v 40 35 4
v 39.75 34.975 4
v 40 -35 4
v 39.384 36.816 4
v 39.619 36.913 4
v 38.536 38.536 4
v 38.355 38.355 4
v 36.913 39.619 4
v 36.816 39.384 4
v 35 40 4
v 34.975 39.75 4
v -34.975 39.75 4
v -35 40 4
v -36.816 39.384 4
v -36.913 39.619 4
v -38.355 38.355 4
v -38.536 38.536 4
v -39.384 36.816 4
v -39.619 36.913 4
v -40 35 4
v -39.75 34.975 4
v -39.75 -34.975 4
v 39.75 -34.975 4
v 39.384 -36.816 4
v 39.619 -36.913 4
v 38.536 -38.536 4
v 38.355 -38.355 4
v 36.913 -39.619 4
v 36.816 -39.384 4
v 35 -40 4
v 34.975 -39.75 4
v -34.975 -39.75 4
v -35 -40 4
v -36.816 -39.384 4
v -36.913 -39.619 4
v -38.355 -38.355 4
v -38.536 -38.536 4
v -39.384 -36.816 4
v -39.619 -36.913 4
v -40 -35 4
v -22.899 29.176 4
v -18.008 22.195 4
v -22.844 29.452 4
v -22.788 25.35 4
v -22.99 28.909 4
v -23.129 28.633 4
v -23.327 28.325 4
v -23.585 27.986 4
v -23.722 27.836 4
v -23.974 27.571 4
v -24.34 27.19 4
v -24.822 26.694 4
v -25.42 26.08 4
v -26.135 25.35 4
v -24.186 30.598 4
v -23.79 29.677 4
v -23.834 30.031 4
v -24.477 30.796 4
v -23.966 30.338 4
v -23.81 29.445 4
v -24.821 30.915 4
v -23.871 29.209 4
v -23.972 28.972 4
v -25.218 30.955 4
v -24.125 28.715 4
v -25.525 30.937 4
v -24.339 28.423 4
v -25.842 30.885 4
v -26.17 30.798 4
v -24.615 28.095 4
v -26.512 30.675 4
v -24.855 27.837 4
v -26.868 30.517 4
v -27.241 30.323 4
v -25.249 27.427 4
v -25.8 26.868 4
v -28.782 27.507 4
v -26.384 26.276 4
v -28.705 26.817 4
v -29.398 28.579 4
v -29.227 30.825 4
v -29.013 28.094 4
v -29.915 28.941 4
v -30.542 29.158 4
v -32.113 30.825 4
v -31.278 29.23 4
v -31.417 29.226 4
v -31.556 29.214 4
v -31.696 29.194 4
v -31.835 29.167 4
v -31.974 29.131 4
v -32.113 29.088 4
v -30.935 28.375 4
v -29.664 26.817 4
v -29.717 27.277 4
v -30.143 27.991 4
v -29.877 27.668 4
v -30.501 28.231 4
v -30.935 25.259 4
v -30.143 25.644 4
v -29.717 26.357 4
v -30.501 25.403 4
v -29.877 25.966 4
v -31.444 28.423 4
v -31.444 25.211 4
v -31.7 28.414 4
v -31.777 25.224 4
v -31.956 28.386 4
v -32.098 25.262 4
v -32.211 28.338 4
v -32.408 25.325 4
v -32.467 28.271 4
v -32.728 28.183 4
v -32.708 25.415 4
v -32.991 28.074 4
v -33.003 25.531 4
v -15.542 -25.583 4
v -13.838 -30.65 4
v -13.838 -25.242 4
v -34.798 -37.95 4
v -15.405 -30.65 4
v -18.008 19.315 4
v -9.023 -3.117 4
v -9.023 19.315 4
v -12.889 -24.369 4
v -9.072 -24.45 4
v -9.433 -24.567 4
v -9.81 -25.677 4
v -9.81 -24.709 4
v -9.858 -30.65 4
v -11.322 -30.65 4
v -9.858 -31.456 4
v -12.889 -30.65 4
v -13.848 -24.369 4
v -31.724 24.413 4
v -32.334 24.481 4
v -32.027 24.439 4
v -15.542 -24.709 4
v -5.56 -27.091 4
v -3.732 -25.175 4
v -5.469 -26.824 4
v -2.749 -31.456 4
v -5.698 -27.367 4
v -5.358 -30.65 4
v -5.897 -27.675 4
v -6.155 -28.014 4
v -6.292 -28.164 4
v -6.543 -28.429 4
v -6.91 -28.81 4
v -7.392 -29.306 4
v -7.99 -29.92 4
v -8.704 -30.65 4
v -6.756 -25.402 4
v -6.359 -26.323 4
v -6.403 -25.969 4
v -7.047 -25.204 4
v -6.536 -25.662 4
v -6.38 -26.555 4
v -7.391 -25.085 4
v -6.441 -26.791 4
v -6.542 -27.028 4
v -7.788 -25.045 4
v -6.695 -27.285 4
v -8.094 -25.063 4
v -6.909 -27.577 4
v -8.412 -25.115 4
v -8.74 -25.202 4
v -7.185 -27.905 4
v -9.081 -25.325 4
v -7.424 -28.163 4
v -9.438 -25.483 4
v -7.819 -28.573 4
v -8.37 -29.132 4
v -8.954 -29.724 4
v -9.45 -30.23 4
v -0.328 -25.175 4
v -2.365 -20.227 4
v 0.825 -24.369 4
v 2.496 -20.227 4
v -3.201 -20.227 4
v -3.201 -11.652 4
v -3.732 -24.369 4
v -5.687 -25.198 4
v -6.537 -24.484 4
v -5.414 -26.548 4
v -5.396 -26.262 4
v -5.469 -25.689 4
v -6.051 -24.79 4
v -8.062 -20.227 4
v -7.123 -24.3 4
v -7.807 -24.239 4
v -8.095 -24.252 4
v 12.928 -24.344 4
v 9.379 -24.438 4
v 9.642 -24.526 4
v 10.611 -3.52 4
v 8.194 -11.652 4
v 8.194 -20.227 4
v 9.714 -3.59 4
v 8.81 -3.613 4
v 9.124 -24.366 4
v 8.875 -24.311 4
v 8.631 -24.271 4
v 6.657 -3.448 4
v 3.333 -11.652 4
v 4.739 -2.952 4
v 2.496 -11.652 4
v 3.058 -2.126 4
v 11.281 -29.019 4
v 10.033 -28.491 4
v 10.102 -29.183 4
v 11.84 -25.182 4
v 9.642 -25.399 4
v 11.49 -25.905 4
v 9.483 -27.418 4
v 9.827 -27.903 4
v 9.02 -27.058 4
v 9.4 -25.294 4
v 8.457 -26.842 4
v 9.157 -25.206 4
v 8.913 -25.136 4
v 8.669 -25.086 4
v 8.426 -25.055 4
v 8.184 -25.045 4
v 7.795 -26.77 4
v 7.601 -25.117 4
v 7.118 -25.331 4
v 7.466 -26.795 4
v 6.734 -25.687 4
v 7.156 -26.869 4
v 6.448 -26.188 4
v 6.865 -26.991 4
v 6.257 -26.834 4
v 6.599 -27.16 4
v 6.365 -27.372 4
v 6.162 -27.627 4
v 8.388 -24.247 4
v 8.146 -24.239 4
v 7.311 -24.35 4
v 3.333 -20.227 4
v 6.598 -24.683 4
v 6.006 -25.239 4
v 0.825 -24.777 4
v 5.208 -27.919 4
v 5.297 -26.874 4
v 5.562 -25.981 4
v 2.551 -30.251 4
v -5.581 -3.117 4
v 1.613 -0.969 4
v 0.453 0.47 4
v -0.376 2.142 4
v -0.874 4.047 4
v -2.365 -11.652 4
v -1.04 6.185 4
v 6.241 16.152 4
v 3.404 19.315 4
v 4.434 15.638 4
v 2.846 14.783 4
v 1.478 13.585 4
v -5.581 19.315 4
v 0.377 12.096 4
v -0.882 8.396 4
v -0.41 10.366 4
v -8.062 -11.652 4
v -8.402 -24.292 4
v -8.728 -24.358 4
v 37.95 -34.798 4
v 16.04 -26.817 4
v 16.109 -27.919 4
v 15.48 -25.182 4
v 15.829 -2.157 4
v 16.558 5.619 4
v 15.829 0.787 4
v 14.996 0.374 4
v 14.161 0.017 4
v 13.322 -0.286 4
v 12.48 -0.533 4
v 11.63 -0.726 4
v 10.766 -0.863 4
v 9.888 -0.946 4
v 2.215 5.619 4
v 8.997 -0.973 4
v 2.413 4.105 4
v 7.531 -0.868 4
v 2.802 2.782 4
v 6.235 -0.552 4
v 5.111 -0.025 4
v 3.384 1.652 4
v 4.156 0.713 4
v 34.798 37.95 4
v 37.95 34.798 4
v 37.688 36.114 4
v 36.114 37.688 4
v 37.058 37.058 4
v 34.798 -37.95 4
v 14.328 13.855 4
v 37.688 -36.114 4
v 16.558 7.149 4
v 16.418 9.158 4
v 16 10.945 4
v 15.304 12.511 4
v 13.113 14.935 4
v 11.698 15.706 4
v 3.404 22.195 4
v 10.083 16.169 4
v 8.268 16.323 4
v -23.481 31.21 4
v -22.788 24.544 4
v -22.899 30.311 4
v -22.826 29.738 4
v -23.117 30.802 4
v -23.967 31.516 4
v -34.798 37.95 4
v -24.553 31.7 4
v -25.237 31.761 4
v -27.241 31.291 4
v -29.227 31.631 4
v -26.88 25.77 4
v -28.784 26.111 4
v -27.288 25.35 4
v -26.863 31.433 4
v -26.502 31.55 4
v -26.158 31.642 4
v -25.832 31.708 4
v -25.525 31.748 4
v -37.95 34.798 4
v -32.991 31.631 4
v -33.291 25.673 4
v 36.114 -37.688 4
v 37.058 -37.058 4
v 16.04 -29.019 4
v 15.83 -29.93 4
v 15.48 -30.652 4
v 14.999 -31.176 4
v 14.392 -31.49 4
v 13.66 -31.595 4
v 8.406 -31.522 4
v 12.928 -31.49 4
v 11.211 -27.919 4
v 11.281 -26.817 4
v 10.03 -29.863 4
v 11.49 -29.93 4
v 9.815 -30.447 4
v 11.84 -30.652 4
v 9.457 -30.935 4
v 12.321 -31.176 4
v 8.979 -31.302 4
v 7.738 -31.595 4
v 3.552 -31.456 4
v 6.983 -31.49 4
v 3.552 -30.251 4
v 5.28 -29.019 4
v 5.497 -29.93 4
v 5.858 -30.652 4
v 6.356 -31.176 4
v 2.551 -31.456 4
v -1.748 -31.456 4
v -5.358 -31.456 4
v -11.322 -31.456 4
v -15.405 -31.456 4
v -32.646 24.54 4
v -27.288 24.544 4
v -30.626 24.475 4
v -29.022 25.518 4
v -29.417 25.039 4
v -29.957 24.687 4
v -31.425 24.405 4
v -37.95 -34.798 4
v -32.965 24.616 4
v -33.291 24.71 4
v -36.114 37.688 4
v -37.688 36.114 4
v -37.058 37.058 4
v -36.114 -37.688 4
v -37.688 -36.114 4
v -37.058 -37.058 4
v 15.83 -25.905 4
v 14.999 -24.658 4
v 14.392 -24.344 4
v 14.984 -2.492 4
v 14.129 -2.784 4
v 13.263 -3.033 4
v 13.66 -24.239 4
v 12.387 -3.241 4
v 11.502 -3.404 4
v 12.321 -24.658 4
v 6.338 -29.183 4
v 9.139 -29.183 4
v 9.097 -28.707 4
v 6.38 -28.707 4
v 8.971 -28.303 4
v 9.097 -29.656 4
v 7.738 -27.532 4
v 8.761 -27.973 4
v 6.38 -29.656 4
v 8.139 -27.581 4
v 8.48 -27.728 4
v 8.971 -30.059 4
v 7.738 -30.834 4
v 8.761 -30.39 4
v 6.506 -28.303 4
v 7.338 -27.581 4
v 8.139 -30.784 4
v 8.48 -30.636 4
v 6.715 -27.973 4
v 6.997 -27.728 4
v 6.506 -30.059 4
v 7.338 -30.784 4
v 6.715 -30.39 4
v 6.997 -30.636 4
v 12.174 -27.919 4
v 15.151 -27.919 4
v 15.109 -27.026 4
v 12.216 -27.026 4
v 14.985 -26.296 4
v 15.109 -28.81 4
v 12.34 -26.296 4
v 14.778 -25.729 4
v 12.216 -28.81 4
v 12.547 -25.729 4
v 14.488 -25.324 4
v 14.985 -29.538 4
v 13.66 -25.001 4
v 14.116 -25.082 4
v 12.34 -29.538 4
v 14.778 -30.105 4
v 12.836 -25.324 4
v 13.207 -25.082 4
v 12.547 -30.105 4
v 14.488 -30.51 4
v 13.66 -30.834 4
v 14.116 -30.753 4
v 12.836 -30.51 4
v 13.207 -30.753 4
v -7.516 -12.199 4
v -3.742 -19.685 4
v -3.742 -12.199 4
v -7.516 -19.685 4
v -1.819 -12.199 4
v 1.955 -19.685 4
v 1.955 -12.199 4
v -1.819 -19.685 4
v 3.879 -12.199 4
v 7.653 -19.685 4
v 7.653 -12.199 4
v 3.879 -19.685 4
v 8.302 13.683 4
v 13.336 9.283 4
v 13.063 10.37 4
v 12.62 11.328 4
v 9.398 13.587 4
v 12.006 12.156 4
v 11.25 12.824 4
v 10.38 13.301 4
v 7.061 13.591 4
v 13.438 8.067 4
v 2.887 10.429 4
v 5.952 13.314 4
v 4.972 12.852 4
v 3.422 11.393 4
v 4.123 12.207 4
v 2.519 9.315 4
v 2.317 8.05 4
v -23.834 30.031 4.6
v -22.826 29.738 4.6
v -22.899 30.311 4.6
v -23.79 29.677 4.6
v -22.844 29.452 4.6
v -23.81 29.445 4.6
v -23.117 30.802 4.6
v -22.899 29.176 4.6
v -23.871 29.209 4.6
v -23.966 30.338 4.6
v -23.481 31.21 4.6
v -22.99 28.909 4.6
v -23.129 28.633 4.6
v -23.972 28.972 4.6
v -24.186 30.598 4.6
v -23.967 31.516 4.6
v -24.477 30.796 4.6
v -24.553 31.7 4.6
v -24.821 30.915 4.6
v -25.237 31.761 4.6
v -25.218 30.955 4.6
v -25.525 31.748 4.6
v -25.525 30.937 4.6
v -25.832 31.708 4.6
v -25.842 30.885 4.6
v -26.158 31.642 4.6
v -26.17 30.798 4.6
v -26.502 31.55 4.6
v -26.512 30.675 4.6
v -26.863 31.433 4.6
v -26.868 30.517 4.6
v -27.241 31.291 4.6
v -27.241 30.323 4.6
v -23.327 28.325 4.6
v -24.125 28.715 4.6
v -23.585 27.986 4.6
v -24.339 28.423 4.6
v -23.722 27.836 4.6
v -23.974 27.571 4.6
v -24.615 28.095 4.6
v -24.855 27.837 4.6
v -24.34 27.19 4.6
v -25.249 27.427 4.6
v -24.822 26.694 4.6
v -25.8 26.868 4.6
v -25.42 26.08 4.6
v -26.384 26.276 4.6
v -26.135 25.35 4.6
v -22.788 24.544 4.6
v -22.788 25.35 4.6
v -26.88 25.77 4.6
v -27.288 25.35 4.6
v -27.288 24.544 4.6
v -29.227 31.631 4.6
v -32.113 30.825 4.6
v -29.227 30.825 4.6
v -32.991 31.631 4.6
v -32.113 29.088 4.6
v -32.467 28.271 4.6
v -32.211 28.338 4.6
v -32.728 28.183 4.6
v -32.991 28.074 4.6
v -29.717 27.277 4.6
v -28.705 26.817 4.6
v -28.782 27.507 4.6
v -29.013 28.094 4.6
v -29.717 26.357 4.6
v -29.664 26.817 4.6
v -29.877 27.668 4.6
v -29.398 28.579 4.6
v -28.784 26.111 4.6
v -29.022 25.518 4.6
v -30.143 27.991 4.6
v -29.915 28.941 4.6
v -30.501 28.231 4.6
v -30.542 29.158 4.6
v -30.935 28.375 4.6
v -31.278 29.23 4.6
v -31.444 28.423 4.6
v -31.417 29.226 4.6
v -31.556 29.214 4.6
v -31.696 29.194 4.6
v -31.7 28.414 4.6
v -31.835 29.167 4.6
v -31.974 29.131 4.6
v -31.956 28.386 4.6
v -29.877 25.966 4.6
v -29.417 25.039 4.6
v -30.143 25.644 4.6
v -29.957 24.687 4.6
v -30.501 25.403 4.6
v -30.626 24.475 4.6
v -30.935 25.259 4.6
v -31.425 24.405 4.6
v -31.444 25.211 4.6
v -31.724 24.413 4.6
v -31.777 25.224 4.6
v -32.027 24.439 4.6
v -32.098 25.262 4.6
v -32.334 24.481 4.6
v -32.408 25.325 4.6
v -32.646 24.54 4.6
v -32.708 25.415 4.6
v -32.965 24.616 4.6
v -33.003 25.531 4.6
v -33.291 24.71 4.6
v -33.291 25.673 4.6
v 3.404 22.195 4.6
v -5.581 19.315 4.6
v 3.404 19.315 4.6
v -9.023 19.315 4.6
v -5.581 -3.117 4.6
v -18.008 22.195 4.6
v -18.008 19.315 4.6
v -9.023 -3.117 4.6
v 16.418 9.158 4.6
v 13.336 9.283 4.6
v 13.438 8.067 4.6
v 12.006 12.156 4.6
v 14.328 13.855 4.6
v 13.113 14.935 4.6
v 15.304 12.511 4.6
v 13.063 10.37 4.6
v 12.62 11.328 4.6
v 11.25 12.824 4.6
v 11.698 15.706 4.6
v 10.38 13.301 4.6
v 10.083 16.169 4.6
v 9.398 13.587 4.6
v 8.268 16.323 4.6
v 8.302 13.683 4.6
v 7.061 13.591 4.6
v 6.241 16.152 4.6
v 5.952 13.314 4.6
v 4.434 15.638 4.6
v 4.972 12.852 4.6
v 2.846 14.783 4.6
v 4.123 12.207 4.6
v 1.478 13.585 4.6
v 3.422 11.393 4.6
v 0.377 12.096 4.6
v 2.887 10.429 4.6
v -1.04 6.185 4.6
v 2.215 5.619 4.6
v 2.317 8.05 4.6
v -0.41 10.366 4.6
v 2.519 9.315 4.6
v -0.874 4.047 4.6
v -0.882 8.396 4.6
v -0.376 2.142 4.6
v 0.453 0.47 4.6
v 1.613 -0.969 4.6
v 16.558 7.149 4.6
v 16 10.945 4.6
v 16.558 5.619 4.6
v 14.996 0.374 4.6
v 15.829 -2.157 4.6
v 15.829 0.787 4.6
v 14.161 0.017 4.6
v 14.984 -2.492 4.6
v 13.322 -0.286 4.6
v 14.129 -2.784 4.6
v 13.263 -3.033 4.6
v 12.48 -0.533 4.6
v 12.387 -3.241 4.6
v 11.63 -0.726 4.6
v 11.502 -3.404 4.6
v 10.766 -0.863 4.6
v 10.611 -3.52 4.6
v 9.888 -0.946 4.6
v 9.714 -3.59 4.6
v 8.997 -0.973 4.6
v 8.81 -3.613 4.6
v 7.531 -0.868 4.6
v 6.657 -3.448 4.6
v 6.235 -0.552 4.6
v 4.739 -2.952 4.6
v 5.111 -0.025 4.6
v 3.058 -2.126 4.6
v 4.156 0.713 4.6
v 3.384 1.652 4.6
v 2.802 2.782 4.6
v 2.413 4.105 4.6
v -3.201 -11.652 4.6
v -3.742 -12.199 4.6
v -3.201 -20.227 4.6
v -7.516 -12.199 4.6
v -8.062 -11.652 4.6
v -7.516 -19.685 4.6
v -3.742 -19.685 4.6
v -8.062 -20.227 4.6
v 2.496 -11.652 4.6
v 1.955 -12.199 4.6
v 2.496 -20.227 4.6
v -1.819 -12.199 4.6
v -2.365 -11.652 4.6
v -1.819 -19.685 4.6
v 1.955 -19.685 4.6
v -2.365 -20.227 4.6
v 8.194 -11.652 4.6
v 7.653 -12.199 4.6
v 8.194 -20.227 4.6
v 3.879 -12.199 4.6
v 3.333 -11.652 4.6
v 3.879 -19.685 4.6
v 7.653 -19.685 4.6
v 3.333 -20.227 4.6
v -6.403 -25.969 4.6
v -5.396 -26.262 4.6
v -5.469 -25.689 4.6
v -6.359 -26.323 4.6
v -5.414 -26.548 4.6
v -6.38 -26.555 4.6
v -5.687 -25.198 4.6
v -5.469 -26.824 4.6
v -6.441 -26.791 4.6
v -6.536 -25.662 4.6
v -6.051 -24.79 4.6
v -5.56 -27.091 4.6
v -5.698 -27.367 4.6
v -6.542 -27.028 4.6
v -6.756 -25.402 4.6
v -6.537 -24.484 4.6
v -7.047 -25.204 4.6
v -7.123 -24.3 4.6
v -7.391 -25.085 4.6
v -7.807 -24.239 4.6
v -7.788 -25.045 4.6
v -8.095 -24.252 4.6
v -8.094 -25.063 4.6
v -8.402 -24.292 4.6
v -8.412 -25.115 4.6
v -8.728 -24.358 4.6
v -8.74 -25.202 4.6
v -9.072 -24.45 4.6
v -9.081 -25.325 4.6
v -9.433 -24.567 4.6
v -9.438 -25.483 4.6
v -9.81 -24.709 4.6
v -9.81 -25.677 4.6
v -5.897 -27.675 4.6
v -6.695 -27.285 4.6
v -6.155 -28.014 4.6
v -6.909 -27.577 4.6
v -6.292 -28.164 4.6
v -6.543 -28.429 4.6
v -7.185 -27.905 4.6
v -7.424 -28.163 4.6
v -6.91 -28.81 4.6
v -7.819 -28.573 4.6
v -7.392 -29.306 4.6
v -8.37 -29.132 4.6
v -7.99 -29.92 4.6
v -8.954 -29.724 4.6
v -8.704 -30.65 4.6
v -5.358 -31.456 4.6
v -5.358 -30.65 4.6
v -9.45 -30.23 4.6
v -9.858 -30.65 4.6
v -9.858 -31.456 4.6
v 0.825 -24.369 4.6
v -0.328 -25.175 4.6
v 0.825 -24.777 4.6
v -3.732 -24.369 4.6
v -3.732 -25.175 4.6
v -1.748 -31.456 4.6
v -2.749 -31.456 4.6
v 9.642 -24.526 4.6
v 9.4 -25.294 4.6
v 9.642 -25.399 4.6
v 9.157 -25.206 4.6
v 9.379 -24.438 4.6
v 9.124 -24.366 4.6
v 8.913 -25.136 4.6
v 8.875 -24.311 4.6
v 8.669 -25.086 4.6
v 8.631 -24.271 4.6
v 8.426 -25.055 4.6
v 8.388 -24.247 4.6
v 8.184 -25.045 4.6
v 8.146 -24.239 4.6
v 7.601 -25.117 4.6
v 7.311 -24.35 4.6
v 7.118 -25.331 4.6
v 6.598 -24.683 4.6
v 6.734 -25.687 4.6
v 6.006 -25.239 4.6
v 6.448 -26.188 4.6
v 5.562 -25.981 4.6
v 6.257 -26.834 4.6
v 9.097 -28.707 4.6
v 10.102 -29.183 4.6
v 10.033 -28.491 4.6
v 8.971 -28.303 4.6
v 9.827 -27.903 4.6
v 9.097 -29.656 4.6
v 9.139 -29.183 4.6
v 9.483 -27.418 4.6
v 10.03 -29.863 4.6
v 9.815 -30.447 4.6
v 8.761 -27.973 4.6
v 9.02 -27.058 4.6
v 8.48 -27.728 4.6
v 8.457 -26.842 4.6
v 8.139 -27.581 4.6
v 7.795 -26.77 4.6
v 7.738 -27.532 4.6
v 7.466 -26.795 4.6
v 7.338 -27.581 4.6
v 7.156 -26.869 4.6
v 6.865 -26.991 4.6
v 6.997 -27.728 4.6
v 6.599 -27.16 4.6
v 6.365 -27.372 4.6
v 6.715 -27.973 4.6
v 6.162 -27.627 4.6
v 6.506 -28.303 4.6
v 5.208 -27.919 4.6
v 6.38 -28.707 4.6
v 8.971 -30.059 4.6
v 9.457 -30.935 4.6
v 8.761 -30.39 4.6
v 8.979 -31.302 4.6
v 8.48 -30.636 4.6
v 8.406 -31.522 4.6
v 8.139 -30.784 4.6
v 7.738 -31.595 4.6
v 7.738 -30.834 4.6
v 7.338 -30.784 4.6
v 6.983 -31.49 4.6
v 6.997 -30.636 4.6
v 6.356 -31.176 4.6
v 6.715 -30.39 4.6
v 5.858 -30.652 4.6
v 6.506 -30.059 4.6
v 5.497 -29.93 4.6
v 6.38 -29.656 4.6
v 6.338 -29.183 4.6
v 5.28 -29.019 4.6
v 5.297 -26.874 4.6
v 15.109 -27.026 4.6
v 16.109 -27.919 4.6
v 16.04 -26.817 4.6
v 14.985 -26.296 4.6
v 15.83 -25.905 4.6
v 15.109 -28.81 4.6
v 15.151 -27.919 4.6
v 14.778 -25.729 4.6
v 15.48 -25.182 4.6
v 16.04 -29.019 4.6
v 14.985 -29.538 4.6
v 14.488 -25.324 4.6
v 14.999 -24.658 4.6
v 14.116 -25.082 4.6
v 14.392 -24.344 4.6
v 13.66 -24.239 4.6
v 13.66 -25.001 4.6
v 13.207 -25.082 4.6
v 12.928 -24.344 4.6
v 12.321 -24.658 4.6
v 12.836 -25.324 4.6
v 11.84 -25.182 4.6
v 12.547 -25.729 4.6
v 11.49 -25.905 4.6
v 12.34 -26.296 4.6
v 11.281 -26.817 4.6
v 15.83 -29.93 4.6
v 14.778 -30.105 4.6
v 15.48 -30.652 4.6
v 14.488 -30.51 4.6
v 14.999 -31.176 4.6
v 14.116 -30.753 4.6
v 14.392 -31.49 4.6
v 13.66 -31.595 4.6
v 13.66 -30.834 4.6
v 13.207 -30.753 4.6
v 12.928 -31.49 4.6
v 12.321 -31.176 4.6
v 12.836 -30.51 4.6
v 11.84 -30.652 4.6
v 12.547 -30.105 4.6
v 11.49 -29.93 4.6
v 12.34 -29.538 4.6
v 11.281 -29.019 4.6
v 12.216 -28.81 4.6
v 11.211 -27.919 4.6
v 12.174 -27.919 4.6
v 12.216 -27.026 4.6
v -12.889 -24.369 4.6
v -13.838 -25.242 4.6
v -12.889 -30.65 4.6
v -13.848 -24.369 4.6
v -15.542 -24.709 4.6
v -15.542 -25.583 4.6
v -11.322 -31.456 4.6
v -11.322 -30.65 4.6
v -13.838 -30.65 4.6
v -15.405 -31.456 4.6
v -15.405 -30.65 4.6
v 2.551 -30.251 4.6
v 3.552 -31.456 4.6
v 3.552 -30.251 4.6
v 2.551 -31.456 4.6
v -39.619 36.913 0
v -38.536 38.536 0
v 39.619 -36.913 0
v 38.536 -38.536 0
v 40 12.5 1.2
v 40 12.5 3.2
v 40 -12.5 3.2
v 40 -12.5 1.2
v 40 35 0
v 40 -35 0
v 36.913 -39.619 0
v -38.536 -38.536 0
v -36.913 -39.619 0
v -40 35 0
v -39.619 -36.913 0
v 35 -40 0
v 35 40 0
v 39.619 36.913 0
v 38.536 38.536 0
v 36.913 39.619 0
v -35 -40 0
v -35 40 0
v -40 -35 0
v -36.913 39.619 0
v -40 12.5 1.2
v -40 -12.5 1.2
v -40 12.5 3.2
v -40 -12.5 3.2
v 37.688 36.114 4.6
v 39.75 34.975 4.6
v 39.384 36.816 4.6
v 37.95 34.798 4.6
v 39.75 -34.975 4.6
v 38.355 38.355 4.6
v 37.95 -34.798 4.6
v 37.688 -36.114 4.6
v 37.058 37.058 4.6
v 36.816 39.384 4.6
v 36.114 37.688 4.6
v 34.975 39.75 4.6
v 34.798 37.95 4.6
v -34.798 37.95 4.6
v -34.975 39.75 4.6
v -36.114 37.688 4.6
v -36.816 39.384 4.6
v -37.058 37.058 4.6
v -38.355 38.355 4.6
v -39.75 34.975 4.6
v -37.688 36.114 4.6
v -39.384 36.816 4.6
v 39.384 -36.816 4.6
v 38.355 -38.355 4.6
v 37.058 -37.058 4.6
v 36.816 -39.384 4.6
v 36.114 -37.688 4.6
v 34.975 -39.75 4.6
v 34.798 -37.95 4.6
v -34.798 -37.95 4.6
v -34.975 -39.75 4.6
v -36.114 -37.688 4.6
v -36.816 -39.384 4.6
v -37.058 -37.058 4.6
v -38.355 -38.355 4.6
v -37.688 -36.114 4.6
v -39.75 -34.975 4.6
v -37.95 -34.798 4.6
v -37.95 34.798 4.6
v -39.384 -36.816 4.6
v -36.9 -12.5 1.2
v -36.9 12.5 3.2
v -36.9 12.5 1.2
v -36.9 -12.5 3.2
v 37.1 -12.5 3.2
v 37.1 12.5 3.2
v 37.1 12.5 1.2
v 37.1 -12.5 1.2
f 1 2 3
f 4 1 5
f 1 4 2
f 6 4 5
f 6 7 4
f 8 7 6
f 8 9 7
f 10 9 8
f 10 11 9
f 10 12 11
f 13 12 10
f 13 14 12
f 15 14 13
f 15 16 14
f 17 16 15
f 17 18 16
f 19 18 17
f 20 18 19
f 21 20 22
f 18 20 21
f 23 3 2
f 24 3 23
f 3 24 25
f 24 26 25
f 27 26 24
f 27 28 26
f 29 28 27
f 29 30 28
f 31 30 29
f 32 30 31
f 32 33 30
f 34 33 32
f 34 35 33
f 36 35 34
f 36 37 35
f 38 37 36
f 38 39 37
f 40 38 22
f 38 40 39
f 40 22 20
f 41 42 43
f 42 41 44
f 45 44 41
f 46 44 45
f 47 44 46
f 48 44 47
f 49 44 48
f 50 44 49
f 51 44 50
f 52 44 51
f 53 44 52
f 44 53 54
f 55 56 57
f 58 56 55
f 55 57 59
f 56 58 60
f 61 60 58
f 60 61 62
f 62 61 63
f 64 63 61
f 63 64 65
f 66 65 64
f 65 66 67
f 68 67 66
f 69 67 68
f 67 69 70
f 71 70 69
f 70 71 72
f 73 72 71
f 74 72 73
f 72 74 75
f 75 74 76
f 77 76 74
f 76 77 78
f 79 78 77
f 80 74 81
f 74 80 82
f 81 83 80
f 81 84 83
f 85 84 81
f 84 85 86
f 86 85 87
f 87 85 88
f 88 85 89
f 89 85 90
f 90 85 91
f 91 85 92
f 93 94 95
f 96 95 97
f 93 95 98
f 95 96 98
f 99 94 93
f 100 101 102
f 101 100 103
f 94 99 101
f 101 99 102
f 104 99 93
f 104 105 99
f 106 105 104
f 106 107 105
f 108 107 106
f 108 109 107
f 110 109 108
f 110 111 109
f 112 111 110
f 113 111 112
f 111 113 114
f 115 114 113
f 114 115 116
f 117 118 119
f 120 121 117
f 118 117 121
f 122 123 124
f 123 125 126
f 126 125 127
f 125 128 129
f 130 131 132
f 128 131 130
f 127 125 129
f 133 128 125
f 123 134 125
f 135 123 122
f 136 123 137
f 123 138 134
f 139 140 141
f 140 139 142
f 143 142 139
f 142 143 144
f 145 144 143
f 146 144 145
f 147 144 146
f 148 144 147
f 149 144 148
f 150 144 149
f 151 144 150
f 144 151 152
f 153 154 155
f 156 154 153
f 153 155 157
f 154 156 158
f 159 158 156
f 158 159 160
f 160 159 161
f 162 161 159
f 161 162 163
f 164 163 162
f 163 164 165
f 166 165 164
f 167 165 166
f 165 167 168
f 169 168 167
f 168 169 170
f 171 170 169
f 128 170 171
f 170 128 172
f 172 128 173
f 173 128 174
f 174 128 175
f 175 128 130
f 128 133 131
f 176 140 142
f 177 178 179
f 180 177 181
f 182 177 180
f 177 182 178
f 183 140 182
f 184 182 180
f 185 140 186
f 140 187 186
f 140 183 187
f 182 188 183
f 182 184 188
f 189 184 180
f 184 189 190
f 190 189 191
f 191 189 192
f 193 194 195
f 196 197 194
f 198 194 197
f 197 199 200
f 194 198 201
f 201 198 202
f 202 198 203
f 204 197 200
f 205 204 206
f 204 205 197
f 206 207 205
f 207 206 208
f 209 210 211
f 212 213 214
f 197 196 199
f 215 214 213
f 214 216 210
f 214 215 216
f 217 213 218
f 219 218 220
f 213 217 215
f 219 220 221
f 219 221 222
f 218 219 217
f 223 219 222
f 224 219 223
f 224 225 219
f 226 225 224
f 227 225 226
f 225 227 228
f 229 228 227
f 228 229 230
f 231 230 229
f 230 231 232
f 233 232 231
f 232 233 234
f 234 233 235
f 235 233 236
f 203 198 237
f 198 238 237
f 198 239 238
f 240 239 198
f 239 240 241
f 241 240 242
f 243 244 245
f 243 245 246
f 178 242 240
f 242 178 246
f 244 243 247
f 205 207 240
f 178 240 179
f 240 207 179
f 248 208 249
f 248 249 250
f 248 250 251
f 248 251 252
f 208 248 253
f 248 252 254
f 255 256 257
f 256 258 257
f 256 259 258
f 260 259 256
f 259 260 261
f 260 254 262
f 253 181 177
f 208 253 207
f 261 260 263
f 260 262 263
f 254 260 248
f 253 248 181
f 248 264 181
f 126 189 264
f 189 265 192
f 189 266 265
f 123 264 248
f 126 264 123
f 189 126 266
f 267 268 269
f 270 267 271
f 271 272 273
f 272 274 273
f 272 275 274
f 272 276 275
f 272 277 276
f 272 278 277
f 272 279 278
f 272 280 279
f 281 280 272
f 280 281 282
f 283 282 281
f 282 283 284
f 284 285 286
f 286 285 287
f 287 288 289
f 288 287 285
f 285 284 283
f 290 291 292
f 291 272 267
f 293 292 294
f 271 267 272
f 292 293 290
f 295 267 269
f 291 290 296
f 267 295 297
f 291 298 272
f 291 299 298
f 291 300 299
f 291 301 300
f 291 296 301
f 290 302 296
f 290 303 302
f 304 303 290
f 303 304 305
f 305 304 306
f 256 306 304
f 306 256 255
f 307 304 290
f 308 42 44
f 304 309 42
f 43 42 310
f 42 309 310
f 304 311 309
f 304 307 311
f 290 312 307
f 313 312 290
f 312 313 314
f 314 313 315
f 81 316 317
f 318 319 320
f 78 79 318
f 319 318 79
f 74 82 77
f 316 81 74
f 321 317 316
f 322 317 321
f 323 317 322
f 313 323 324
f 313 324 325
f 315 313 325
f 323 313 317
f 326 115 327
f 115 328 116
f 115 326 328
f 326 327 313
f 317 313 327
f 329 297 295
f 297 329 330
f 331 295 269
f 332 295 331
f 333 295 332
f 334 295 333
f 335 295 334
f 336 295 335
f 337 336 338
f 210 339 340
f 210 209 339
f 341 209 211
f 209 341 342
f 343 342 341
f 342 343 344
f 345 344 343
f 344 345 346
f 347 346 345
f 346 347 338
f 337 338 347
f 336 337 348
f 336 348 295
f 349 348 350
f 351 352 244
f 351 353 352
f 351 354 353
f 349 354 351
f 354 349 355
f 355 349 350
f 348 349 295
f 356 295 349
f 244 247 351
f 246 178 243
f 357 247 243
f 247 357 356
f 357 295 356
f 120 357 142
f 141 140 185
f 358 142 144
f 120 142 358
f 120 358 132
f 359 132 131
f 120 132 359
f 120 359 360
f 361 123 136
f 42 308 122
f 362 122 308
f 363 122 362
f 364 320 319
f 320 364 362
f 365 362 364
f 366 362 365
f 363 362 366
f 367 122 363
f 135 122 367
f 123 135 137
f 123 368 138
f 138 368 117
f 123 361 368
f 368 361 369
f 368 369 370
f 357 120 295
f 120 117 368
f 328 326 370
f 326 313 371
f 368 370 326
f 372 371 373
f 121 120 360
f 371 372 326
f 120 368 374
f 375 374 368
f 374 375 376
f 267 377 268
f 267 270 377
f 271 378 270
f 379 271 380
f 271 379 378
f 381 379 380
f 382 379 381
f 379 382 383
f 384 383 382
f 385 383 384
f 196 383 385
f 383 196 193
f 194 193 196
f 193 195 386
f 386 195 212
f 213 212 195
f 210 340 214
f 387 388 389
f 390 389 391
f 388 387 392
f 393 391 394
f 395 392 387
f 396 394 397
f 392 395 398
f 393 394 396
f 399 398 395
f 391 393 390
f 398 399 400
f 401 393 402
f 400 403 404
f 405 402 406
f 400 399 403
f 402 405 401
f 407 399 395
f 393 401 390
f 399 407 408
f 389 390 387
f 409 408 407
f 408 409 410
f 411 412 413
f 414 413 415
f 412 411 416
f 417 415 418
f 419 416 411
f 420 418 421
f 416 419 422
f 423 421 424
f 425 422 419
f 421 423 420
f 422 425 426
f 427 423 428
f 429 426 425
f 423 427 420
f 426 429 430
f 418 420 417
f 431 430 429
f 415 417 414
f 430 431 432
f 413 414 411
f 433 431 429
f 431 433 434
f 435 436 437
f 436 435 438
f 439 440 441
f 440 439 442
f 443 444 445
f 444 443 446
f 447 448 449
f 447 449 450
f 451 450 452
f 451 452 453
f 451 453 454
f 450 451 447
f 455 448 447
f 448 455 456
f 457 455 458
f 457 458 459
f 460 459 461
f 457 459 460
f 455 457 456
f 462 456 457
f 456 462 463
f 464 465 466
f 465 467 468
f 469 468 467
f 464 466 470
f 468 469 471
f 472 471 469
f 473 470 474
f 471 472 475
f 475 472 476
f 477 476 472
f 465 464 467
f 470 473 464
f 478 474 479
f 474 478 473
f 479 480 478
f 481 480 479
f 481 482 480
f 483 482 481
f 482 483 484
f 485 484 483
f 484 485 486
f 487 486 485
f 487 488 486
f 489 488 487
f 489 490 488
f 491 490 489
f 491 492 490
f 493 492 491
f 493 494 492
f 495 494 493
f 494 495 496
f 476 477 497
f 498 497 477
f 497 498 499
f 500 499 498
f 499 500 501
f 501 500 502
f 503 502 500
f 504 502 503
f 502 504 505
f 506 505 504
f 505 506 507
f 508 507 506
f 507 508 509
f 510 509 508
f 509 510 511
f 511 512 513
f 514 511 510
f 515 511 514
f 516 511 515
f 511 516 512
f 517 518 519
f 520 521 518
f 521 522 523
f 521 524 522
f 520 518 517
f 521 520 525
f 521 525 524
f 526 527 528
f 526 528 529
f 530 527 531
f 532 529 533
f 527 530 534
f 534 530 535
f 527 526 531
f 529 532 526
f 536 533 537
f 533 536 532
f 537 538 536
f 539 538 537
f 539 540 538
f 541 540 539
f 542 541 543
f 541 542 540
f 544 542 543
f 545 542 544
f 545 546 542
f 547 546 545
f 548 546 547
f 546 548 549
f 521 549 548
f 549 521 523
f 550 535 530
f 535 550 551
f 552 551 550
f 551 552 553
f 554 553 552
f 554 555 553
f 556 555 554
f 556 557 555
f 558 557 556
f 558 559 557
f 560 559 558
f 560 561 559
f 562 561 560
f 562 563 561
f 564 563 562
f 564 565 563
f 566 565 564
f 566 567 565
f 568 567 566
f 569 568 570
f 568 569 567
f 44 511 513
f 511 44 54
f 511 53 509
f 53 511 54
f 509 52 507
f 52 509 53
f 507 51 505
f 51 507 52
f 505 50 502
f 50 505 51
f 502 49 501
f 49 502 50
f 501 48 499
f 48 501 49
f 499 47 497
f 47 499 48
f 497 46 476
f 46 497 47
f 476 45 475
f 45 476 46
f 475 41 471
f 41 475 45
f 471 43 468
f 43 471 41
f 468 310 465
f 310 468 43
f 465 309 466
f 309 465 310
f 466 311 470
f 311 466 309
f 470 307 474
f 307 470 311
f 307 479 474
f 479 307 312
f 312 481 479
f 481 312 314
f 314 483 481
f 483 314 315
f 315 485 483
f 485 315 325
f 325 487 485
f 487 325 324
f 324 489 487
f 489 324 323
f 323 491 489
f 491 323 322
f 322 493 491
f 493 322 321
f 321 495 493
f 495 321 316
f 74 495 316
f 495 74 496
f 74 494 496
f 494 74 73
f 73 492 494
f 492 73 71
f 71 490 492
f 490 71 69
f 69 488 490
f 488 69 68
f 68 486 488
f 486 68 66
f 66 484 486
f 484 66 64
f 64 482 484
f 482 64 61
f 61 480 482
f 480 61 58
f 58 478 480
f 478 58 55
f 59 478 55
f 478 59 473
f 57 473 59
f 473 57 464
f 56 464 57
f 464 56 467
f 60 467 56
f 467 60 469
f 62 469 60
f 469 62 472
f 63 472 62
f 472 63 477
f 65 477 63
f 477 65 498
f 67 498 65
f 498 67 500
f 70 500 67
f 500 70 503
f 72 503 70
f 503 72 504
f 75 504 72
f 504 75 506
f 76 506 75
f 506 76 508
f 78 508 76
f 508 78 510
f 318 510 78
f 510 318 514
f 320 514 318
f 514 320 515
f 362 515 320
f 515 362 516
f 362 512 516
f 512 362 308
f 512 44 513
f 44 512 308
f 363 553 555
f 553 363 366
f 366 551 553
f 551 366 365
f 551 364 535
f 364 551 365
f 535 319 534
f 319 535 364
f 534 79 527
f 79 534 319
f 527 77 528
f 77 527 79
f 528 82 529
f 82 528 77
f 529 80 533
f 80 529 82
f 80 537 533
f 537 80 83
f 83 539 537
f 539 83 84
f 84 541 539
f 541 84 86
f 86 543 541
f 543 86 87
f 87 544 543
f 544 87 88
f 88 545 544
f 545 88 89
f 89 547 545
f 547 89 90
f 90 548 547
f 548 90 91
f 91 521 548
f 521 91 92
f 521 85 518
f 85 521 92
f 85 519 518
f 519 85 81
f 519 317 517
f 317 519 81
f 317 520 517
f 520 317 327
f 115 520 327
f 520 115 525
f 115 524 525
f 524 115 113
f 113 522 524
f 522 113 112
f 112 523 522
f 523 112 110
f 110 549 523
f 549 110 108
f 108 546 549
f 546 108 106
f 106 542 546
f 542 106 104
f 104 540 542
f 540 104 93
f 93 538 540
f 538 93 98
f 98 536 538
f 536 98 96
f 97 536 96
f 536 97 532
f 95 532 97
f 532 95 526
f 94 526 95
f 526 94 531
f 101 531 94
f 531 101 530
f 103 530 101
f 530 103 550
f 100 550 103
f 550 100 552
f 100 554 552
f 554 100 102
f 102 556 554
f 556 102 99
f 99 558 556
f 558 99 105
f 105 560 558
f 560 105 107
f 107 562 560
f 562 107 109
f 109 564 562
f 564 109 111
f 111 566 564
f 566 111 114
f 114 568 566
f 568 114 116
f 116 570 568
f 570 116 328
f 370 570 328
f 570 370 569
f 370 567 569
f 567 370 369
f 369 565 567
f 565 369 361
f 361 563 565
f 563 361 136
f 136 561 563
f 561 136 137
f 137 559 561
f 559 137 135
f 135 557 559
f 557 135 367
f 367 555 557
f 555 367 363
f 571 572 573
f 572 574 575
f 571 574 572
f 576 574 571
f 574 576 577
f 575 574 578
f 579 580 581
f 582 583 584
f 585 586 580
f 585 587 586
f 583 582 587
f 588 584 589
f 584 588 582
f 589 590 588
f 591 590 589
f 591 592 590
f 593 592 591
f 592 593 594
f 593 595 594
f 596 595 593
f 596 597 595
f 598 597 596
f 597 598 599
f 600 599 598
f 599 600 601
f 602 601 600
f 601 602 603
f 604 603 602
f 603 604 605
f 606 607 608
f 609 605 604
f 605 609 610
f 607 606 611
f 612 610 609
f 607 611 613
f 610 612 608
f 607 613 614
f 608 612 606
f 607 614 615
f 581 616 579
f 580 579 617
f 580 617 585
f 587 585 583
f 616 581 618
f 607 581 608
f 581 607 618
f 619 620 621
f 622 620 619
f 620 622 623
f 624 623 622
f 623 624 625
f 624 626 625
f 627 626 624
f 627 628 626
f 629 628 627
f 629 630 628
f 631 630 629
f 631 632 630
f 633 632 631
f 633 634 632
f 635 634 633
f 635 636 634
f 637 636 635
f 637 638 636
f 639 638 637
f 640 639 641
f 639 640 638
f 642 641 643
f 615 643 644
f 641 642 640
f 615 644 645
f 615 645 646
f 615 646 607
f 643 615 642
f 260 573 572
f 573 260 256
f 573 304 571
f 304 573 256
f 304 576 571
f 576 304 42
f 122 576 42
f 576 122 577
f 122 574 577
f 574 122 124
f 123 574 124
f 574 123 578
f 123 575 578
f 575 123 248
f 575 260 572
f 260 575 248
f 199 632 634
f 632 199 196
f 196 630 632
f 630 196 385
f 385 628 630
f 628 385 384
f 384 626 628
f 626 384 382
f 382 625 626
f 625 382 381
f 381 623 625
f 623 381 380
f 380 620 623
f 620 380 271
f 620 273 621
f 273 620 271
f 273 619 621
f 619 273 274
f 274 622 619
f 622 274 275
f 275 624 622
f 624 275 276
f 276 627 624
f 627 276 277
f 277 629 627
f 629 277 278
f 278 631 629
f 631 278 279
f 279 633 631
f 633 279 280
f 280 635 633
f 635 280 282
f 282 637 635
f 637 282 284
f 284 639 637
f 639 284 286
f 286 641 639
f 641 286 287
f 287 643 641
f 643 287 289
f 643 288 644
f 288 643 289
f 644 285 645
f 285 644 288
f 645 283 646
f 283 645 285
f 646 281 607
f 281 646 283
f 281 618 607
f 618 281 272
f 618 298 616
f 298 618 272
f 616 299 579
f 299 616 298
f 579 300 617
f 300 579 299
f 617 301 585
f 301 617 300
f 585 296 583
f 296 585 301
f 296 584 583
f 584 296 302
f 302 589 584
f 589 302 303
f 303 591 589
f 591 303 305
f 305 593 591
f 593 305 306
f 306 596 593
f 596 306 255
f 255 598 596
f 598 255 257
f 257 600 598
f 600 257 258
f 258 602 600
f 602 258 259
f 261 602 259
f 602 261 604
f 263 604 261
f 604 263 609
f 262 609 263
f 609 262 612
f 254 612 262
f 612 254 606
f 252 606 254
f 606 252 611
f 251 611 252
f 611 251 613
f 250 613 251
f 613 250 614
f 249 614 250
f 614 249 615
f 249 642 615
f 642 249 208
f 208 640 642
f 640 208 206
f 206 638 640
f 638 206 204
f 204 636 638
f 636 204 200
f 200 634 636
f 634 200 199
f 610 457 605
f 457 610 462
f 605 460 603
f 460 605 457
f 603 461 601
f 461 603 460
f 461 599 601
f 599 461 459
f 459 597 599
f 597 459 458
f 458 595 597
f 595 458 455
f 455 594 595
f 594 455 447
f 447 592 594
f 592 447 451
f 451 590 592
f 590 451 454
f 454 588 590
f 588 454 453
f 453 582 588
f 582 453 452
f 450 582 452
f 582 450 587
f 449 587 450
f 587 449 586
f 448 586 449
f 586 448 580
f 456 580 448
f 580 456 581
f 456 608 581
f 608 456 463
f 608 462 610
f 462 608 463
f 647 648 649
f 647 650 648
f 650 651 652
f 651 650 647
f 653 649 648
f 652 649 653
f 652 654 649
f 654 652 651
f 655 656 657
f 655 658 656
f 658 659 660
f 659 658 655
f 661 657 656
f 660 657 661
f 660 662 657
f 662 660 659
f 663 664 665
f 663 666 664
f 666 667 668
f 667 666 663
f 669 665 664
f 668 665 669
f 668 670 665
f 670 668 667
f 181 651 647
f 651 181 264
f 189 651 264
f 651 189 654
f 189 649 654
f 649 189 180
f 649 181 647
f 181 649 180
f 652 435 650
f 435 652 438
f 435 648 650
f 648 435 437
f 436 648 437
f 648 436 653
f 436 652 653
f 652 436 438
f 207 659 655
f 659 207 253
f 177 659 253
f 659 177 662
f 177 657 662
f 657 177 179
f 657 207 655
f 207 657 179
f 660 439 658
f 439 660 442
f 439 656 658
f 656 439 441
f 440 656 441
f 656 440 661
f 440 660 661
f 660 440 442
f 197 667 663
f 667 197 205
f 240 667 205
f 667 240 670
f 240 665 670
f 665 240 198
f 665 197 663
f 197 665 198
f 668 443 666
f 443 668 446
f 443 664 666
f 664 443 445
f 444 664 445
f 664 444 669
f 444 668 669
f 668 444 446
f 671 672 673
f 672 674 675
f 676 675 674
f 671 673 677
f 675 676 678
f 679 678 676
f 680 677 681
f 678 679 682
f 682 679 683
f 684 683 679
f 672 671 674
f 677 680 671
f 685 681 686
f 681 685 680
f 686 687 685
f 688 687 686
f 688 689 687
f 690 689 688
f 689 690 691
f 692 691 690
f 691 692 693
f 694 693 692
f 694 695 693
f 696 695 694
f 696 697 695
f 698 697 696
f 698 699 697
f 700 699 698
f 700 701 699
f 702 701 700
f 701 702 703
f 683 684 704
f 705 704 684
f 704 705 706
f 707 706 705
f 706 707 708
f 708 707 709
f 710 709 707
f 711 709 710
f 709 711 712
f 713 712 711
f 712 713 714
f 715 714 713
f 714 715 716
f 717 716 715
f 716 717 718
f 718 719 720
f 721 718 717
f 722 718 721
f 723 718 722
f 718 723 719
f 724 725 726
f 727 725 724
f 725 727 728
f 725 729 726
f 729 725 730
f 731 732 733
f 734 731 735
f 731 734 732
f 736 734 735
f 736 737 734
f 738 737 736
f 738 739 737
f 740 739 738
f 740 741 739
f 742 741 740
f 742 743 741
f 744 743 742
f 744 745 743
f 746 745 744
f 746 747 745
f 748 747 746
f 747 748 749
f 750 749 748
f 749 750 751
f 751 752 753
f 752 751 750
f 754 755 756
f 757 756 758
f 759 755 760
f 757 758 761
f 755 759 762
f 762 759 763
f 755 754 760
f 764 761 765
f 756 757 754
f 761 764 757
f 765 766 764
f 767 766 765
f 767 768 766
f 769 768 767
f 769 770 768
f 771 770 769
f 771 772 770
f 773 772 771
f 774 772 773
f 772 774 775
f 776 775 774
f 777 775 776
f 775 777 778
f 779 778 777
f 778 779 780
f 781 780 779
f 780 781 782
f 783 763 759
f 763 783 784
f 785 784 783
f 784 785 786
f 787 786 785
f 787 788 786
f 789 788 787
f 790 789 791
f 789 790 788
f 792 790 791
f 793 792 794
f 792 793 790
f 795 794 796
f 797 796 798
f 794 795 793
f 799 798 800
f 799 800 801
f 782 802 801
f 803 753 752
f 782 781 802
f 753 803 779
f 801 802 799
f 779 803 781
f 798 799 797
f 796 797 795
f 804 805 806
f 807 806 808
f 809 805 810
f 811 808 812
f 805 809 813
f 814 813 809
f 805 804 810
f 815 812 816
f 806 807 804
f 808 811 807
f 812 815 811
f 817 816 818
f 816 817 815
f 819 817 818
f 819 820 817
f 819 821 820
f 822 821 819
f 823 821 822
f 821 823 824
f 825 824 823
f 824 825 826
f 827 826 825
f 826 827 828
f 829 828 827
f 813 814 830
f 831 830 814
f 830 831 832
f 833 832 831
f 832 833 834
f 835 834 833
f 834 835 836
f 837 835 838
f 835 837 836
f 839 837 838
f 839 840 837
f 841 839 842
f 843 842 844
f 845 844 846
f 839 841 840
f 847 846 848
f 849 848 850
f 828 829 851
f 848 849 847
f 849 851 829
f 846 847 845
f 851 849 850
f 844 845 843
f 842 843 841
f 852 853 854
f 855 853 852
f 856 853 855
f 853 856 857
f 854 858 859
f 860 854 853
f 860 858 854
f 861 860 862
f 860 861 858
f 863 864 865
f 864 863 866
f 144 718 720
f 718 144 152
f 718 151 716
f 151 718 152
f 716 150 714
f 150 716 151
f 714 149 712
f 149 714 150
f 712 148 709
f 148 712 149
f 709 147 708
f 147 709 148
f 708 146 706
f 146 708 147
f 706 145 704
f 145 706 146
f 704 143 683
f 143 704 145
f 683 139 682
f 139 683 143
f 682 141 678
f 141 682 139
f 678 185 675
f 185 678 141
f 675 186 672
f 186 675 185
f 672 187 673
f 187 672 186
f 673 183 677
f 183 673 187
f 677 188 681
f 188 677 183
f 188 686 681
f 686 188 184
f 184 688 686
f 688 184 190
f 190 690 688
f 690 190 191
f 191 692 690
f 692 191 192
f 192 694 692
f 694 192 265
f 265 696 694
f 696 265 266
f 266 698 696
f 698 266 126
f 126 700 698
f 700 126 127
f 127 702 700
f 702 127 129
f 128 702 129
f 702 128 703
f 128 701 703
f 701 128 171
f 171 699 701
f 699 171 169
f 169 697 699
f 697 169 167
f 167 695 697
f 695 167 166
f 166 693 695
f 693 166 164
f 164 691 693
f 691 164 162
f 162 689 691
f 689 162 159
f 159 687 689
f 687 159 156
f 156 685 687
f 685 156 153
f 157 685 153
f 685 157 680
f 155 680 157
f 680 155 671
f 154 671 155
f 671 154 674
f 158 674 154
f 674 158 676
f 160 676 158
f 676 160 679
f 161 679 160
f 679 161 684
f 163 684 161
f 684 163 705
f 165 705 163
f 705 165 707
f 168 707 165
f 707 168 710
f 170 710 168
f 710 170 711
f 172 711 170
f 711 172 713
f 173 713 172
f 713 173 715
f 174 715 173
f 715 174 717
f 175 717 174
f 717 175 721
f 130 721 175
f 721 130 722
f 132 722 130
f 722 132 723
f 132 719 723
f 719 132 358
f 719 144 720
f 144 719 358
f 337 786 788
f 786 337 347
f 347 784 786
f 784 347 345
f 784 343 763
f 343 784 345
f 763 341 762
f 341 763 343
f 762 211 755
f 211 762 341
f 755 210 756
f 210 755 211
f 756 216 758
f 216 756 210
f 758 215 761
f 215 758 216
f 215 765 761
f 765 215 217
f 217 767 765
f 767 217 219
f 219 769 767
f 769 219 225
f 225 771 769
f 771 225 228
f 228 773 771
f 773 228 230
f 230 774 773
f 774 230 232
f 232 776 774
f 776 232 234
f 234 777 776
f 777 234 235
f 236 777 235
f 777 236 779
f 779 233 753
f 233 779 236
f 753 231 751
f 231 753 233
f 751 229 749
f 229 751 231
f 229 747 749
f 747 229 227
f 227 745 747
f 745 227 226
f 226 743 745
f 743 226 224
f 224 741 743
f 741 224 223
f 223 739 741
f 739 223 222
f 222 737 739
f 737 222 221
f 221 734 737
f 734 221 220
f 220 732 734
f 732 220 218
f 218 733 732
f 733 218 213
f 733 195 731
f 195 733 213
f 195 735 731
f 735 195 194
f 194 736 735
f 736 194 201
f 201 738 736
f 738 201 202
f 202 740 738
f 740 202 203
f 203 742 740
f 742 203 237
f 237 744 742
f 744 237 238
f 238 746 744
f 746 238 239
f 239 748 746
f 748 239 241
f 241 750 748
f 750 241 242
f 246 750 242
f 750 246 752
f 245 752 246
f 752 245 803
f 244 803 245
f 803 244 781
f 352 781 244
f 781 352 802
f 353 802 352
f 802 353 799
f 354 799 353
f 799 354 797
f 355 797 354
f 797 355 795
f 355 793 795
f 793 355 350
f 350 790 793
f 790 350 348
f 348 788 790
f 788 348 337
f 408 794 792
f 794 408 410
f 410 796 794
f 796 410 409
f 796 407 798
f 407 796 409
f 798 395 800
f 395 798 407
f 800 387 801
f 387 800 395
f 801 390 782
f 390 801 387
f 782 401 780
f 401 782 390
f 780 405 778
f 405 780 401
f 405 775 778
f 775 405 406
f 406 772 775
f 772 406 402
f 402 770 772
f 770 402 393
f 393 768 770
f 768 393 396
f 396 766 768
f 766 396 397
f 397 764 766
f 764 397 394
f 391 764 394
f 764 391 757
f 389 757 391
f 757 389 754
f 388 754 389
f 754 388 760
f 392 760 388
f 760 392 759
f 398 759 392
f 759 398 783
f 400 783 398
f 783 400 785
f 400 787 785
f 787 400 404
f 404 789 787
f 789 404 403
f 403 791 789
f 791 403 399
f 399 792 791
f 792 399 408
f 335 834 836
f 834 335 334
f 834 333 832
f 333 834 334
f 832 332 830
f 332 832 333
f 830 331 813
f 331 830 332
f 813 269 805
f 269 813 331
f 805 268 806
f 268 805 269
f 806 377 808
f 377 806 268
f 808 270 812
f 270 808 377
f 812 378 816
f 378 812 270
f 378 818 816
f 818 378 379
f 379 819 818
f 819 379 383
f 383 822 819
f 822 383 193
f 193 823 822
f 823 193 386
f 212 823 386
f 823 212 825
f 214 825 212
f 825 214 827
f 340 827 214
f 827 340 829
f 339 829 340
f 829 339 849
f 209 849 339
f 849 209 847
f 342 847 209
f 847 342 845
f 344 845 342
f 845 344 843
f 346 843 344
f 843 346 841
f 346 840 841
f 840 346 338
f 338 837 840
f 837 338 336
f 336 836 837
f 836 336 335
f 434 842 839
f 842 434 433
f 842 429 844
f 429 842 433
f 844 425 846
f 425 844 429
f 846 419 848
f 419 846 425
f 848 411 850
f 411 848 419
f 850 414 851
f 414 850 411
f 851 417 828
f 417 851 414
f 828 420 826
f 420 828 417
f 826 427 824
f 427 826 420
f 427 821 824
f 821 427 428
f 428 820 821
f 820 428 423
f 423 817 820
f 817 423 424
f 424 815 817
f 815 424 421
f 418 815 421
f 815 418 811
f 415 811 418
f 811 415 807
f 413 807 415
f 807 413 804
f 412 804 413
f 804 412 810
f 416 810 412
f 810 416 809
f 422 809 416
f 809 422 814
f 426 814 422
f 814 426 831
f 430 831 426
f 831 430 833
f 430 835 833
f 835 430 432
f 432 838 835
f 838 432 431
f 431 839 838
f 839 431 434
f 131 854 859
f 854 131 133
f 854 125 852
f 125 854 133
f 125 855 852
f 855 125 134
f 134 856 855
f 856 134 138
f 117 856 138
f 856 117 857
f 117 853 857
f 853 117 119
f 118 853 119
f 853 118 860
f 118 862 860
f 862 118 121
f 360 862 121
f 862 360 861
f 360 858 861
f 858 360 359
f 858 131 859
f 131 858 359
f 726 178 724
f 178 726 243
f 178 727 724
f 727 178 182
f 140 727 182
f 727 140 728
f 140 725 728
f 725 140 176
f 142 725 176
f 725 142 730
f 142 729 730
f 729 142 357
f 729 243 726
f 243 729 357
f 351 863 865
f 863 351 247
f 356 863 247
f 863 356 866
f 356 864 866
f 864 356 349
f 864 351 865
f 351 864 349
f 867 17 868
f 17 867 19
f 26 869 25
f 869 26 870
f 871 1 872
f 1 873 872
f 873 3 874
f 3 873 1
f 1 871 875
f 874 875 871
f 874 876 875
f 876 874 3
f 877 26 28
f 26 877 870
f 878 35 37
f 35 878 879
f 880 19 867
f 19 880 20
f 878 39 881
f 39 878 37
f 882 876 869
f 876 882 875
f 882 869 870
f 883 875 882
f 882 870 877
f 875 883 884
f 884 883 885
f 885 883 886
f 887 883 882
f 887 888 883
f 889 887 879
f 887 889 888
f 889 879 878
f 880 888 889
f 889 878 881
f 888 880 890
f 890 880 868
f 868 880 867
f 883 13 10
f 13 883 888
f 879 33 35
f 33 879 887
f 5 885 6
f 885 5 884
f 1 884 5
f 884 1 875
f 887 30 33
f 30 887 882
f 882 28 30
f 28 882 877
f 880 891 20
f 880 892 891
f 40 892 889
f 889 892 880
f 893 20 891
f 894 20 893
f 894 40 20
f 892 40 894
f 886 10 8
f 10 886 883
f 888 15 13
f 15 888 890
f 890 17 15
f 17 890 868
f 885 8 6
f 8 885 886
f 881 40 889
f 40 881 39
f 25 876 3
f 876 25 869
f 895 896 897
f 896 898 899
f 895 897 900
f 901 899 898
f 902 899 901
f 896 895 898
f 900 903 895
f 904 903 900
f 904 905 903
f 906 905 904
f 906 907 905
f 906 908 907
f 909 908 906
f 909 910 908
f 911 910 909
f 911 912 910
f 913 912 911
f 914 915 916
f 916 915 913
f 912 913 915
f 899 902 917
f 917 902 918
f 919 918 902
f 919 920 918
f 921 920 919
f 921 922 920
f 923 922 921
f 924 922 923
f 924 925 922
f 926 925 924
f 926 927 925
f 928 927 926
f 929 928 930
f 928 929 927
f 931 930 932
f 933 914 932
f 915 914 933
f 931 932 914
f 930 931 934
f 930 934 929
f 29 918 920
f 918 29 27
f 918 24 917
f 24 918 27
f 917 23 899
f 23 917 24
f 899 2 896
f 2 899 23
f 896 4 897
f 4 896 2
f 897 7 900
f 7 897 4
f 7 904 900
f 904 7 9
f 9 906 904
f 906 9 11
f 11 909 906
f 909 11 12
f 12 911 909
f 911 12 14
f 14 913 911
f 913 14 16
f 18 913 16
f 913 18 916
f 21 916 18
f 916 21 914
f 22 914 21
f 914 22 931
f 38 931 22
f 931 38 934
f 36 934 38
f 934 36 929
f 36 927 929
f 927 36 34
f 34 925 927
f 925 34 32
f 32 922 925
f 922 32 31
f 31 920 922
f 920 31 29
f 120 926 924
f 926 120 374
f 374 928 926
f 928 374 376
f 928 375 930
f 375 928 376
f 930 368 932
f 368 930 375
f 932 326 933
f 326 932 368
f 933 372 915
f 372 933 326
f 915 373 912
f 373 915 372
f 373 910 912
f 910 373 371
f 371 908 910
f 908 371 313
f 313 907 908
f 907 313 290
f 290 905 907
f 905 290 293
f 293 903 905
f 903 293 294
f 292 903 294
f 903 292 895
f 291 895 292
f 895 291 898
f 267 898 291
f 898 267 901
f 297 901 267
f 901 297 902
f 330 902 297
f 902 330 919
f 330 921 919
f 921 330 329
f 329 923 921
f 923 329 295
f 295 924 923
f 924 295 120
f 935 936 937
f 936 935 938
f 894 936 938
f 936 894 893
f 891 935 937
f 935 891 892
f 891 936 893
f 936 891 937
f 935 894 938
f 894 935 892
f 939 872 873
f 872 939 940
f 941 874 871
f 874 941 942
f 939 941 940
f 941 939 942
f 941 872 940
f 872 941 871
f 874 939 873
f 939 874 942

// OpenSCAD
// Element tile generator (Korean-friendly)
// Usage from command line:
// openscad -o out/Te.stl -D "symbol='Te'" -D "name='텔루륨'" -D "number='127.60'" -D "atomic_number='52'" element_tiles.scad

symbol = "Te";
name = "텔루륨";
number = "127.60";
atomic_number = "52";

// Choose output piece
show_tile = true;
show_connector = false;

// Use an installed Nanum font. Change if your system uses a different family name.
font_name = "NanumGothic:style=Regular";

// ======================
// Main parameters
// ======================
tile_size = 80;
corner_radius = 5;
base_thickness = 4;

frame_width = 1.8;
frame_height = 0.6;

text_height = 0.6;
symbol_size = 25;
name_size = 7;
number_size = 7;
atomic_size = 7;

slot_width = 25;
slot_height = 2.0;
slot_depth = 3.0;
slot_z = 1.2;

fit_clearance = 0.15;
connector_length = slot_width - 0.2;
connector_height = slot_height - fit_clearance;
connector_depth = 2*(slot_depth - fit_clearance);
connector_gap = 8;
connector_corner = 0.6;

atomic_x = -28;
atomic_y = 28;

symbol_x = 0;
symbol_y = 9;

name_x = 0;
name_y = -16;

number_x = 0;
number_y = -28;

module rounded_square(sz, r) {
    offset(r = r)
        square([sz - 2*r, sz - 2*r], center = true);
}

module outer_shape_2d() {
    rounded_square(tile_size, corner_radius);
}

frame_inset = 0.25;

module outer_frame_2d() {
    difference() {
        offset(delta = -frame_inset)
            outer_shape_2d();
        offset(delta = -(frame_inset + frame_width))
            outer_shape_2d();
    }
}

module base_body() {
    linear_extrude(height = base_thickness)
        outer_shape_2d();
}

module top_outer_frame() {
    translate([0,0,base_thickness])
        linear_extrude(height = frame_height)
            outer_frame_2d();
}

module left_slot() {
    translate([-tile_size/2 - 0.1, -slot_width/2, slot_z])
        cube([slot_depth + 0.2, slot_width, slot_height]);
}

module right_slot() {
    translate([tile_size/2 - slot_depth + 0.1, -slot_width/2, slot_z])
        cube([slot_depth + 0.2, slot_width, slot_height]);
}

module texts() {
    translate([atomic_x, atomic_y, base_thickness])
        linear_extrude(height = text_height)
            text(atomic_number, size = atomic_size, halign = "center", valign = "center", font = font_name);

    translate([symbol_x, symbol_y, base_thickness])
        linear_extrude(height = text_height)
            text(symbol, size = symbol_size, halign = "center", valign = "center", font = font_name);

    translate([name_x, name_y, base_thickness])
        linear_extrude(height = text_height)
            text(name, size = name_size, halign = "center", valign = "center", font = font_name);

    translate([number_x, number_y, base_thickness])
        linear_extrude(height = text_height)
            text(number, size = number_size, halign = "center", valign = "center", font = font_name);
}

module tile() {
    difference() {
        union() {
            base_body();
            top_outer_frame();
            texts();
        }
        left_slot();
        right_slot();
    }
}

module connector() {
    linear_extrude(height = connector_height)
        offset(r = connector_corner)
            square(
                [connector_depth - 2*connector_corner,
                 connector_length - 2*connector_corner],
                center = true
            );
}

if (show_tile)
    tile();

if (show_connector)
    translate([0, -(tile_size/2 + connector_gap), 0])
        rotate([0,0,90])
            connector();
